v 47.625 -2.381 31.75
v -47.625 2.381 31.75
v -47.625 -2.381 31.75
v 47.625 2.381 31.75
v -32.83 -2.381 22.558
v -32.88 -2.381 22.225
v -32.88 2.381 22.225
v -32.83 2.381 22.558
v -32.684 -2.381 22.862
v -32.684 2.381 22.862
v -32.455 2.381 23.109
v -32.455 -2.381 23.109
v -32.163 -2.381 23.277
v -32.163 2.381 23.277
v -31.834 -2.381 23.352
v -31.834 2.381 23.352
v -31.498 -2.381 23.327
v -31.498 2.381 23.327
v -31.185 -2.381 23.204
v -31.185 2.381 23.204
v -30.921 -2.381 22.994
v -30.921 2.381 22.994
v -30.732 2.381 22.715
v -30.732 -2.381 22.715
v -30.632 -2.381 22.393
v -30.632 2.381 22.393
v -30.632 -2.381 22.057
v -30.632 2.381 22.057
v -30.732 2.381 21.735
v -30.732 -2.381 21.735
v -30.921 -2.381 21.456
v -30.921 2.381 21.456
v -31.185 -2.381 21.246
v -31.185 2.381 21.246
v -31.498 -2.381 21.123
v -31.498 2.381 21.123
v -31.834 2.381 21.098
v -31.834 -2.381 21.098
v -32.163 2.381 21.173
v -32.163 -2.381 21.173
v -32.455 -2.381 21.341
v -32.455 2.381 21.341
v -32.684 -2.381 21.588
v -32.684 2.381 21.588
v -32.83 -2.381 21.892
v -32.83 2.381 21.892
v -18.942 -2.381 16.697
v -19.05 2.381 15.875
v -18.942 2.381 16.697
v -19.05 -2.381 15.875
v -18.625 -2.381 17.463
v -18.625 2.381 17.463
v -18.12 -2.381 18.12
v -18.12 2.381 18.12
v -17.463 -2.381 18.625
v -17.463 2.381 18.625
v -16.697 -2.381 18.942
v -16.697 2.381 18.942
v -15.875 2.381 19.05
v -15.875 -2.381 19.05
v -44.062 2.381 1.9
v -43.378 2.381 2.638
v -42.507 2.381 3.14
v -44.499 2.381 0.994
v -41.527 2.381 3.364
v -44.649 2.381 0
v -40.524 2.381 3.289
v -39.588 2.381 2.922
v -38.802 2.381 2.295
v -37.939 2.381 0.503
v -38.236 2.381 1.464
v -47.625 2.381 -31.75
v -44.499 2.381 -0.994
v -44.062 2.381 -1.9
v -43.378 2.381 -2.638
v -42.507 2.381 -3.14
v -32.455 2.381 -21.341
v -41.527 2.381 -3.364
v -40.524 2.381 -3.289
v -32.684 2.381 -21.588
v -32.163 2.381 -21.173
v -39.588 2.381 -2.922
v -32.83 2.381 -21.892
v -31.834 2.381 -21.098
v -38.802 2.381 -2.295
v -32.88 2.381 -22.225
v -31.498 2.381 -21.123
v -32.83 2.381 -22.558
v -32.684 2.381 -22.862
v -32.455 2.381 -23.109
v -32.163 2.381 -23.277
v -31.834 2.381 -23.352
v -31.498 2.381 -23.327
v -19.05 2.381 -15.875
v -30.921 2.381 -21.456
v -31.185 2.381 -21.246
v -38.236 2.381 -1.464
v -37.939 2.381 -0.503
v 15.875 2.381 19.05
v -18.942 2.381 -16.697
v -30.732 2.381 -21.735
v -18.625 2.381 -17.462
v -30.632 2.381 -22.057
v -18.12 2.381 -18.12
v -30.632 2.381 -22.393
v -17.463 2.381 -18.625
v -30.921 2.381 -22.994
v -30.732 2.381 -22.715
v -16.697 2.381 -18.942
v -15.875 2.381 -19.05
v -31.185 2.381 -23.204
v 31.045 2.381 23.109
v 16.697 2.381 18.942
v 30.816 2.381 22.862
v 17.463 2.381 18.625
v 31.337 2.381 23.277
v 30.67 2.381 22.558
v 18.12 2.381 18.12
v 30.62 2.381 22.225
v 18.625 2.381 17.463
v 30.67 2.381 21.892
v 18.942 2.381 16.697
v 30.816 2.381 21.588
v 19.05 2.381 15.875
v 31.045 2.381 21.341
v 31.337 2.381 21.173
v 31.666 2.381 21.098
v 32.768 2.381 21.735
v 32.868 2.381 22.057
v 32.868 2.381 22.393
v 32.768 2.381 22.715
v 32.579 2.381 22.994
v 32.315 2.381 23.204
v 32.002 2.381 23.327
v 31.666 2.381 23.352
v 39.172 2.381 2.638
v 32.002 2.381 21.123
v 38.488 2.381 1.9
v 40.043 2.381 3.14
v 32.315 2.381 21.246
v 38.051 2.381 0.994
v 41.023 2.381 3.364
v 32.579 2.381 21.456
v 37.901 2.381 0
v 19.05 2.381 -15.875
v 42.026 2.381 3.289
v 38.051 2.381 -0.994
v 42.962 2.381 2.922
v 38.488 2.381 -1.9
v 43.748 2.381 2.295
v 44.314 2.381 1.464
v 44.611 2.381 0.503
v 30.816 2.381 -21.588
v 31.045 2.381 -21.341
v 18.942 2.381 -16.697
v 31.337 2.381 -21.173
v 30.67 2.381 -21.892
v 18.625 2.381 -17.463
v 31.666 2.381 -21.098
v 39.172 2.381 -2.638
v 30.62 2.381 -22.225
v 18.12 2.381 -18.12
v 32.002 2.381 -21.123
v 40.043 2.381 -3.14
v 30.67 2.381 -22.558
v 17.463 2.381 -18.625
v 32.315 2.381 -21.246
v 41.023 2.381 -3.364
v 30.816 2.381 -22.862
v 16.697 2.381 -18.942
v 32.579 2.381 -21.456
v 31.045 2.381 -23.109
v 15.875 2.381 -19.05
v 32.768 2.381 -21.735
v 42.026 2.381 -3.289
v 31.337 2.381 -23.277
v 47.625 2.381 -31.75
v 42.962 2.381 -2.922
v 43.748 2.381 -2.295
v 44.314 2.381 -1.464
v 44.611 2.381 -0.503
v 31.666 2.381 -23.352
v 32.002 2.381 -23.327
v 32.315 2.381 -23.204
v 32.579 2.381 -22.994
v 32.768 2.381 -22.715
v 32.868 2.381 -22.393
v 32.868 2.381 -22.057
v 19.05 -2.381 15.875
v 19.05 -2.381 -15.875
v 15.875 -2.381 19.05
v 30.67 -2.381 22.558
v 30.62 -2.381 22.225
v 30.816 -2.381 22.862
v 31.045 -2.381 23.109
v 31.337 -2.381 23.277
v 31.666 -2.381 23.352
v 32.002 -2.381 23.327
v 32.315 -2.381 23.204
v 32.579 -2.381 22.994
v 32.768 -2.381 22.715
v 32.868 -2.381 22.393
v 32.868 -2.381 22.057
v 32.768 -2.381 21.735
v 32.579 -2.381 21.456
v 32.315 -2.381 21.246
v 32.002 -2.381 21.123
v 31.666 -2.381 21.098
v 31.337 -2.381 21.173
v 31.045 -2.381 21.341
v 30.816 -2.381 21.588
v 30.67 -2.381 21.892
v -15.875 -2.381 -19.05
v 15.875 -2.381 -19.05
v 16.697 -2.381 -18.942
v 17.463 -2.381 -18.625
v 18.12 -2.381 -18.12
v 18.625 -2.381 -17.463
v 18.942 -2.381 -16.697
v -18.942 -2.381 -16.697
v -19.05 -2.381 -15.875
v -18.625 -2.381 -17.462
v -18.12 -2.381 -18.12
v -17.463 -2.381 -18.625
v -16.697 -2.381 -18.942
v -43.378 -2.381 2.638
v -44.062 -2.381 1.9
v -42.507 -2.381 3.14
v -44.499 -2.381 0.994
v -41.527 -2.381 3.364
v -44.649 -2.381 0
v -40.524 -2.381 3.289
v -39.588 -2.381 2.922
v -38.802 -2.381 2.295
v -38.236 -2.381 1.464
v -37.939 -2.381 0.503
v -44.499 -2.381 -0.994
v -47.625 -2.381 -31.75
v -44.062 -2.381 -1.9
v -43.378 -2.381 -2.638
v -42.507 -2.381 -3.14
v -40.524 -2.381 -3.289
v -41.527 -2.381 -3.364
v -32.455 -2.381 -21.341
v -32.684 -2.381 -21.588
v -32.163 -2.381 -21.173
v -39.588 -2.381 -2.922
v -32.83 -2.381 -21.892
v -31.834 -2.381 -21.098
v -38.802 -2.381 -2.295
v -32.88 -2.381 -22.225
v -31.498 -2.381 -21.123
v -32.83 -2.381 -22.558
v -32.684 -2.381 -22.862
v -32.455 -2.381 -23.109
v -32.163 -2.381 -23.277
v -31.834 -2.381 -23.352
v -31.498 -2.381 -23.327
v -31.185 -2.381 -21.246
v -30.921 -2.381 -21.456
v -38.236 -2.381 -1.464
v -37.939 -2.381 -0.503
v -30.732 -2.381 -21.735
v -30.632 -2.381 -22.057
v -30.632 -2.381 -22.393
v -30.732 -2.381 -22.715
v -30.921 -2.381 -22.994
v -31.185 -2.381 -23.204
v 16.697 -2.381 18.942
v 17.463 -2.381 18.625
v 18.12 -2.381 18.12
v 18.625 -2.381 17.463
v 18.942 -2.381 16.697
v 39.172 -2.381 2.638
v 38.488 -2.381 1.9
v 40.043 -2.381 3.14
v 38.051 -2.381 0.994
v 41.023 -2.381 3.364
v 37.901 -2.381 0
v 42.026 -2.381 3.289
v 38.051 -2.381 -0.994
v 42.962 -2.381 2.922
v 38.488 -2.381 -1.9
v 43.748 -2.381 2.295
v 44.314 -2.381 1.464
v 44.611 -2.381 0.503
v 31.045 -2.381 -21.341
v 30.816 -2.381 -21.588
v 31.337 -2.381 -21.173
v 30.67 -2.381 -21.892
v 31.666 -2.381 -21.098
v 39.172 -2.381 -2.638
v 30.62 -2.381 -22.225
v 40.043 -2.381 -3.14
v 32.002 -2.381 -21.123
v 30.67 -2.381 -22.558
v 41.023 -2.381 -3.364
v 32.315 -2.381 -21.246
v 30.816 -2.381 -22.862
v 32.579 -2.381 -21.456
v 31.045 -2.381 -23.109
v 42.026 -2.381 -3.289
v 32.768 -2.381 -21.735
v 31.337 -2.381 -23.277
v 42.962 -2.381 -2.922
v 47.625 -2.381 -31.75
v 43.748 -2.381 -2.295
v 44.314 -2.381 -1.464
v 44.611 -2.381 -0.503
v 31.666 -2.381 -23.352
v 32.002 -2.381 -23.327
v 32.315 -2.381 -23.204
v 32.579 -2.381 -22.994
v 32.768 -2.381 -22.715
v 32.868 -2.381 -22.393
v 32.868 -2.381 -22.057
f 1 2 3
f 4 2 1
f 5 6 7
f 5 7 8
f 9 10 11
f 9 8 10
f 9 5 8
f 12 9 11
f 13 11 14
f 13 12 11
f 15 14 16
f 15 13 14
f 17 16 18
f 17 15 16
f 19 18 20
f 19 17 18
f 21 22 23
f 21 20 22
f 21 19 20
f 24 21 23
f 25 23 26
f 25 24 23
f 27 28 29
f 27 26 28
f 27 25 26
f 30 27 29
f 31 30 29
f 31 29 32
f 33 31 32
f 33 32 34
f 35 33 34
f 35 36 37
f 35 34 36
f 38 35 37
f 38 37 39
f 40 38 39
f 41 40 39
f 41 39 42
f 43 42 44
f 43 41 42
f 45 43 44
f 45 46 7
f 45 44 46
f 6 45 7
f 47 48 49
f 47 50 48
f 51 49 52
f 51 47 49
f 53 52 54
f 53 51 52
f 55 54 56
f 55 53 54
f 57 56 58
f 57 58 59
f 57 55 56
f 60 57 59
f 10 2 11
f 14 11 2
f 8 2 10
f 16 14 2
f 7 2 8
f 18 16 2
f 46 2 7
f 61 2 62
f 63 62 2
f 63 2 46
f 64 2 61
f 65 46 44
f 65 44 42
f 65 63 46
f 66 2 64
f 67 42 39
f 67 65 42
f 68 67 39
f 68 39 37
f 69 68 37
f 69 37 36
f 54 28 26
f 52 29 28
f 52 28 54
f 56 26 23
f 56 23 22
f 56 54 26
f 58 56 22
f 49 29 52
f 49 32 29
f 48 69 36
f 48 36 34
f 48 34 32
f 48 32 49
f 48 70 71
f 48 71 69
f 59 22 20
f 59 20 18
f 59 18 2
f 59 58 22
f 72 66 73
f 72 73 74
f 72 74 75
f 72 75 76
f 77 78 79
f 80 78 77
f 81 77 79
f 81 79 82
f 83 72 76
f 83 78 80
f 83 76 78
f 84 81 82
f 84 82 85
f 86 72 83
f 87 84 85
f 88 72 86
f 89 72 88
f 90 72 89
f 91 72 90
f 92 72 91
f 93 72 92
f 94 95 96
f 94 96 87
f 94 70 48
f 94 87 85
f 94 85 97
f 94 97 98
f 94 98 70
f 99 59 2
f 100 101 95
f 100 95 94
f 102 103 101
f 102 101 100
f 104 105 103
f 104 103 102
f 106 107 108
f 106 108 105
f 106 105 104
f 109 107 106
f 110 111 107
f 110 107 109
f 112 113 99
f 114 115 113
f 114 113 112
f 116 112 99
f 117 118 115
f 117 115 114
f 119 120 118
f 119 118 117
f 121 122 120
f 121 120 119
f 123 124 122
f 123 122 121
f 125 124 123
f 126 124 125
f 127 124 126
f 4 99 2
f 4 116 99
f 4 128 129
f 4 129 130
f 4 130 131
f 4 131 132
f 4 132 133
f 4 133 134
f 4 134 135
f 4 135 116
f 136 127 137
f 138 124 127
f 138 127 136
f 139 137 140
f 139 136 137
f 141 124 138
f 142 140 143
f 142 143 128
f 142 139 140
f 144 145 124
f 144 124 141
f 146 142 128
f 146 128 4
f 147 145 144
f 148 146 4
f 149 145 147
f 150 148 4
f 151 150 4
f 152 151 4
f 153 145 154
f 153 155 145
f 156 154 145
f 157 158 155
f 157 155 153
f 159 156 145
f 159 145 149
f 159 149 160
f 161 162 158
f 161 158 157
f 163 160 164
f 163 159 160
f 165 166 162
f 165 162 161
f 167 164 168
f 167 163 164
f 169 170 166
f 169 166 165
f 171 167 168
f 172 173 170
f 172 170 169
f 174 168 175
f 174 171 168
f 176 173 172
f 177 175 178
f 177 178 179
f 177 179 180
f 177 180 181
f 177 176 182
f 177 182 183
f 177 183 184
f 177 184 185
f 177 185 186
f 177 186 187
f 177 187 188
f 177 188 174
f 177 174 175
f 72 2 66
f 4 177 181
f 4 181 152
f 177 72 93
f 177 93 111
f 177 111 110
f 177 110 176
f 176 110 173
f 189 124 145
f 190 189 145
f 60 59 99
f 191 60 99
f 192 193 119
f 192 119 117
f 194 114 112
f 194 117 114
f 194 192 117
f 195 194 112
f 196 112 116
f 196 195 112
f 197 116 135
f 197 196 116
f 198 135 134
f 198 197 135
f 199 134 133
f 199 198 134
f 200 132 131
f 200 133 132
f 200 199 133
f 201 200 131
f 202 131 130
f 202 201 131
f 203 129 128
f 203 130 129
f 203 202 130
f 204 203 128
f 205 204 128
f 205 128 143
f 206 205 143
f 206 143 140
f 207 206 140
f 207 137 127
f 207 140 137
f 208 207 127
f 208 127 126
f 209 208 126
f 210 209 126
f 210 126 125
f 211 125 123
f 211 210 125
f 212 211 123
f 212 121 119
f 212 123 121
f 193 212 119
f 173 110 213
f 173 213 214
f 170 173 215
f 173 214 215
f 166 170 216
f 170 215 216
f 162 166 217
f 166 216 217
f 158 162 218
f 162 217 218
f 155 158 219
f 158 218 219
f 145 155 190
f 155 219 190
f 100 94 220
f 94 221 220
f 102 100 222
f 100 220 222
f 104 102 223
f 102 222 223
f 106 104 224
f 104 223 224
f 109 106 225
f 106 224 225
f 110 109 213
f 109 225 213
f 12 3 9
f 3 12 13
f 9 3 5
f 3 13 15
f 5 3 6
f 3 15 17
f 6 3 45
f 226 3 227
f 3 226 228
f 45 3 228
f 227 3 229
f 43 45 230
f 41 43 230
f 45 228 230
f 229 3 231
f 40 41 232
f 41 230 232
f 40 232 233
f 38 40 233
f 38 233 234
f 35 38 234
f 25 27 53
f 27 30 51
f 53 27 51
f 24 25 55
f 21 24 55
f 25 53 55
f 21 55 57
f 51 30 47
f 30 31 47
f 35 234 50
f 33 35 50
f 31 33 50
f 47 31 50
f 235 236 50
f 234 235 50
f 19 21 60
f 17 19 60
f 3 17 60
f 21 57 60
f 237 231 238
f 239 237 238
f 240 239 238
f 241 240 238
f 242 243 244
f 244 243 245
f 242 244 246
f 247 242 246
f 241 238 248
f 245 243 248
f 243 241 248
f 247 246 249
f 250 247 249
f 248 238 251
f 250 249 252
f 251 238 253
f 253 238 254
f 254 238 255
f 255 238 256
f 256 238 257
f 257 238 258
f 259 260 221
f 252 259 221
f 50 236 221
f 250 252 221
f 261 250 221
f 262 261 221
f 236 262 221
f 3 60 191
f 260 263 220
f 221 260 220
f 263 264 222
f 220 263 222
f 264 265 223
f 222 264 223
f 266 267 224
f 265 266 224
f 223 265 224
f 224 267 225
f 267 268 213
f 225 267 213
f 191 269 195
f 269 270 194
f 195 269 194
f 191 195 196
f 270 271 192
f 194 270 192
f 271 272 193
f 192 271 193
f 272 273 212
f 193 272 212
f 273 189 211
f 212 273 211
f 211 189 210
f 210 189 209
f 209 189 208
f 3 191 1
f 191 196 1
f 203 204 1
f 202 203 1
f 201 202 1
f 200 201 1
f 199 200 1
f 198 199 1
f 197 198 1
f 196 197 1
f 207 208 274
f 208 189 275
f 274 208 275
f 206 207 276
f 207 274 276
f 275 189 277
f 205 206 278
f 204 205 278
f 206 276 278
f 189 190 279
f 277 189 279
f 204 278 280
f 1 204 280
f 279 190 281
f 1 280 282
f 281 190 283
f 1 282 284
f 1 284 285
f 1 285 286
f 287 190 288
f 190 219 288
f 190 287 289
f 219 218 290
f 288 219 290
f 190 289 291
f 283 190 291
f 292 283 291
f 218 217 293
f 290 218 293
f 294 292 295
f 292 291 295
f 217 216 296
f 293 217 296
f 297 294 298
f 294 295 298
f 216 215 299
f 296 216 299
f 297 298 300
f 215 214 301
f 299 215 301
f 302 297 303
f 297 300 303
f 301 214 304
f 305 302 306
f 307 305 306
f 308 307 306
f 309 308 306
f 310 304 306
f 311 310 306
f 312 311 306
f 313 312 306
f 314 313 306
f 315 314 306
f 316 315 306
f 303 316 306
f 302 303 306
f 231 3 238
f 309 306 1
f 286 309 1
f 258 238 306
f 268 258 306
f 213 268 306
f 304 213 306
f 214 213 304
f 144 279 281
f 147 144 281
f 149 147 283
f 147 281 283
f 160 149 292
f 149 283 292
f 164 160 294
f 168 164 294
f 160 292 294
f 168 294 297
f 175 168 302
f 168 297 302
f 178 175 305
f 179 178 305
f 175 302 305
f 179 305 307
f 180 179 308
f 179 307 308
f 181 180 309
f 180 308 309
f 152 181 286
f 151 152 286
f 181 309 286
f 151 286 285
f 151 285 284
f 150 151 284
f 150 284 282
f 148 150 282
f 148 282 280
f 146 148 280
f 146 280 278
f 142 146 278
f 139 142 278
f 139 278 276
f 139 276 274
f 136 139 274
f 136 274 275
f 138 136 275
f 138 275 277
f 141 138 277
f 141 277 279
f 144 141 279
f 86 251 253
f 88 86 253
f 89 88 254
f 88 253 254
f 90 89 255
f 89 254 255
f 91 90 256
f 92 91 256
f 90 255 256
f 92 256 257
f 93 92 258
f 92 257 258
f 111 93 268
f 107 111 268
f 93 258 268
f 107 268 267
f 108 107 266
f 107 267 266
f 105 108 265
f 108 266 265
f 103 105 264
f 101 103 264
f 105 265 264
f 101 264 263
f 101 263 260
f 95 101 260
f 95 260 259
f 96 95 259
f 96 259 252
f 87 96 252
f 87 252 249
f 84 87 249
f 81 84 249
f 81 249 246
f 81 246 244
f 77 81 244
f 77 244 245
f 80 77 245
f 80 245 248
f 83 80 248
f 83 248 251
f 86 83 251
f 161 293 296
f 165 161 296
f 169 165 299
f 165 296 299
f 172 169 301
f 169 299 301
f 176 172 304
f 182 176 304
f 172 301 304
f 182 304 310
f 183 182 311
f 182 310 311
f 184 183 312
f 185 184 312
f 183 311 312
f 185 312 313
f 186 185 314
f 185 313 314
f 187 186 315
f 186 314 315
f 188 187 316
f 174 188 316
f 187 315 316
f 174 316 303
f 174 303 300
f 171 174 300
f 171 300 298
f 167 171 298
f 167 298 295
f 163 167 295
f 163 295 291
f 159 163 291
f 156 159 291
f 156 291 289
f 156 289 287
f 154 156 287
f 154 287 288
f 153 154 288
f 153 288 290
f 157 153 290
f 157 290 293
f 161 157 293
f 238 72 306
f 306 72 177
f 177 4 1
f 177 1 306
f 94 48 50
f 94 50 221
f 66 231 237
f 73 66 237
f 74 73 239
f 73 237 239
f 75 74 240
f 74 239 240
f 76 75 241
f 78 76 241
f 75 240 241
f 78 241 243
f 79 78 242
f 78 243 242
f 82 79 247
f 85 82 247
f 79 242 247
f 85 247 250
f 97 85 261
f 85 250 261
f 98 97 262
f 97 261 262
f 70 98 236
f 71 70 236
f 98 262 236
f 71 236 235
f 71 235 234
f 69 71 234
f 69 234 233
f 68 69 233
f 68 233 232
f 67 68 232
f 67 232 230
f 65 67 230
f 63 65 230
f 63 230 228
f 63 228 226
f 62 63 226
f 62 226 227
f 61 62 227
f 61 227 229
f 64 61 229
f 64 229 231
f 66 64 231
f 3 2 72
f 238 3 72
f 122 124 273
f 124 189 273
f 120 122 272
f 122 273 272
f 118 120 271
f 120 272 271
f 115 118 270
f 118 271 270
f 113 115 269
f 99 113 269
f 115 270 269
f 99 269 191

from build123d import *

# Parameters (mm, degrees)
SKETCH1_W                        = 95.25
SKETCH1_H                        = 63.5
BOSS_EXTRUDE1_DEPTH              = 2.38125
CUT_EXTRUDE1_REACH               = 59.436
SKETCH2_W                        = 38.1
SKETCH2_H                        = 38.1
F_4_40_TAPPED_HOLE1_D            = 2.2606
F_17_64_0_26563_DIAMETER_HOLE1_D = 6.747002
FILLET1_R                        = 3.175
FILLET2_R                        = 3.175
FILLET3_R                        = 3.175
FILLET4_R                        = 3.175


with BuildPart() as part:
    # Sketch1 → Boss-Extrude1 (new, symmetric)
    with BuildSketch(Plane(origin=(0, 0, 0), x_dir=(1, 0, 0), z_dir=(0, 1, 0))):
        Rectangle(SKETCH1_W, SKETCH1_H)
    extrude(amount=BOSS_EXTRUDE1_DEPTH, both=True)

    # Sketch2 → Cut-Extrude1 (cut, up to next)
    with BuildSketch(Plane(origin=(0, 2.38125, 0), x_dir=(1, 0, 0), z_dir=(0, 1, 0)), mode=Mode.PRIVATE) as cut_extrude1_sk1:
        Rectangle(SKETCH2_W, SKETCH2_H)
    cut_extrude1_tool1 = extrude(cut_extrude1_sk1.sketch, amount=-CUT_EXTRUDE1_REACH, mode=Mode.PRIVATE) & part.part
    add(cut_extrude1_tool1.solids().sort_by_distance((0, 2.38125, 0))[0], mode=Mode.SUBTRACT)

    # #4-40 Tapped Hole1 (through all)
    with Locations(Plane(origin=(0, 2.38125, 0), x_dir=(1, 0, 0), z_dir=(0, 1, 0))):
        with Locations((-31.75, 22.225), (31.75, 22.225)):
            f_4_40_tapped_hole1 = Hole(F_4_40_TAPPED_HOLE1_D / 2)

    # Mirror1: #4-40 Tapped Hole1 across plane
    add(f_4_40_tapped_hole1.mirror(Plane.XY), mode=Mode.SUBTRACT)

    # 17/64 (0.26563) Diameter Hole1 (through all)
    with Locations(Plane(origin=(0, 2.38125, 0), x_dir=(1, 0, 0), z_dir=(0, 1, 0))):
        with Locations((-41.275, 0), (41.275, 0)):
            Hole(F_17_64_0_26563_DIAMETER_HOLE1_D / 2)

    # Fillet1
    fillet1_edges = [part.edges().sort_by_distance(p)[0] for p in [
        (-19.05, 0, -19.05),
    ]]
    fillet(fillet1_edges, radius=FILLET1_R)

    # Fillet2
    fillet2_edges = [part.edges().sort_by_distance(p)[0] for p in [
        (-19.05, 0, 19.05),
    ]]
    fillet(fillet2_edges, radius=FILLET2_R)

    # Fillet3
    fillet3_edges = [part.edges().sort_by_distance(p)[0] for p in [
        (19.05, 0, -19.05),
    ]]
    fillet(fillet3_edges, radius=FILLET3_R)

    # Fillet4
    fillet4_edges = [part.edges().sort_by_distance(p)[0] for p in [
        (19.05, 0, 19.05),
    ]]
    fillet(fillet4_edges, radius=FILLET4_R)


solid = part.part
